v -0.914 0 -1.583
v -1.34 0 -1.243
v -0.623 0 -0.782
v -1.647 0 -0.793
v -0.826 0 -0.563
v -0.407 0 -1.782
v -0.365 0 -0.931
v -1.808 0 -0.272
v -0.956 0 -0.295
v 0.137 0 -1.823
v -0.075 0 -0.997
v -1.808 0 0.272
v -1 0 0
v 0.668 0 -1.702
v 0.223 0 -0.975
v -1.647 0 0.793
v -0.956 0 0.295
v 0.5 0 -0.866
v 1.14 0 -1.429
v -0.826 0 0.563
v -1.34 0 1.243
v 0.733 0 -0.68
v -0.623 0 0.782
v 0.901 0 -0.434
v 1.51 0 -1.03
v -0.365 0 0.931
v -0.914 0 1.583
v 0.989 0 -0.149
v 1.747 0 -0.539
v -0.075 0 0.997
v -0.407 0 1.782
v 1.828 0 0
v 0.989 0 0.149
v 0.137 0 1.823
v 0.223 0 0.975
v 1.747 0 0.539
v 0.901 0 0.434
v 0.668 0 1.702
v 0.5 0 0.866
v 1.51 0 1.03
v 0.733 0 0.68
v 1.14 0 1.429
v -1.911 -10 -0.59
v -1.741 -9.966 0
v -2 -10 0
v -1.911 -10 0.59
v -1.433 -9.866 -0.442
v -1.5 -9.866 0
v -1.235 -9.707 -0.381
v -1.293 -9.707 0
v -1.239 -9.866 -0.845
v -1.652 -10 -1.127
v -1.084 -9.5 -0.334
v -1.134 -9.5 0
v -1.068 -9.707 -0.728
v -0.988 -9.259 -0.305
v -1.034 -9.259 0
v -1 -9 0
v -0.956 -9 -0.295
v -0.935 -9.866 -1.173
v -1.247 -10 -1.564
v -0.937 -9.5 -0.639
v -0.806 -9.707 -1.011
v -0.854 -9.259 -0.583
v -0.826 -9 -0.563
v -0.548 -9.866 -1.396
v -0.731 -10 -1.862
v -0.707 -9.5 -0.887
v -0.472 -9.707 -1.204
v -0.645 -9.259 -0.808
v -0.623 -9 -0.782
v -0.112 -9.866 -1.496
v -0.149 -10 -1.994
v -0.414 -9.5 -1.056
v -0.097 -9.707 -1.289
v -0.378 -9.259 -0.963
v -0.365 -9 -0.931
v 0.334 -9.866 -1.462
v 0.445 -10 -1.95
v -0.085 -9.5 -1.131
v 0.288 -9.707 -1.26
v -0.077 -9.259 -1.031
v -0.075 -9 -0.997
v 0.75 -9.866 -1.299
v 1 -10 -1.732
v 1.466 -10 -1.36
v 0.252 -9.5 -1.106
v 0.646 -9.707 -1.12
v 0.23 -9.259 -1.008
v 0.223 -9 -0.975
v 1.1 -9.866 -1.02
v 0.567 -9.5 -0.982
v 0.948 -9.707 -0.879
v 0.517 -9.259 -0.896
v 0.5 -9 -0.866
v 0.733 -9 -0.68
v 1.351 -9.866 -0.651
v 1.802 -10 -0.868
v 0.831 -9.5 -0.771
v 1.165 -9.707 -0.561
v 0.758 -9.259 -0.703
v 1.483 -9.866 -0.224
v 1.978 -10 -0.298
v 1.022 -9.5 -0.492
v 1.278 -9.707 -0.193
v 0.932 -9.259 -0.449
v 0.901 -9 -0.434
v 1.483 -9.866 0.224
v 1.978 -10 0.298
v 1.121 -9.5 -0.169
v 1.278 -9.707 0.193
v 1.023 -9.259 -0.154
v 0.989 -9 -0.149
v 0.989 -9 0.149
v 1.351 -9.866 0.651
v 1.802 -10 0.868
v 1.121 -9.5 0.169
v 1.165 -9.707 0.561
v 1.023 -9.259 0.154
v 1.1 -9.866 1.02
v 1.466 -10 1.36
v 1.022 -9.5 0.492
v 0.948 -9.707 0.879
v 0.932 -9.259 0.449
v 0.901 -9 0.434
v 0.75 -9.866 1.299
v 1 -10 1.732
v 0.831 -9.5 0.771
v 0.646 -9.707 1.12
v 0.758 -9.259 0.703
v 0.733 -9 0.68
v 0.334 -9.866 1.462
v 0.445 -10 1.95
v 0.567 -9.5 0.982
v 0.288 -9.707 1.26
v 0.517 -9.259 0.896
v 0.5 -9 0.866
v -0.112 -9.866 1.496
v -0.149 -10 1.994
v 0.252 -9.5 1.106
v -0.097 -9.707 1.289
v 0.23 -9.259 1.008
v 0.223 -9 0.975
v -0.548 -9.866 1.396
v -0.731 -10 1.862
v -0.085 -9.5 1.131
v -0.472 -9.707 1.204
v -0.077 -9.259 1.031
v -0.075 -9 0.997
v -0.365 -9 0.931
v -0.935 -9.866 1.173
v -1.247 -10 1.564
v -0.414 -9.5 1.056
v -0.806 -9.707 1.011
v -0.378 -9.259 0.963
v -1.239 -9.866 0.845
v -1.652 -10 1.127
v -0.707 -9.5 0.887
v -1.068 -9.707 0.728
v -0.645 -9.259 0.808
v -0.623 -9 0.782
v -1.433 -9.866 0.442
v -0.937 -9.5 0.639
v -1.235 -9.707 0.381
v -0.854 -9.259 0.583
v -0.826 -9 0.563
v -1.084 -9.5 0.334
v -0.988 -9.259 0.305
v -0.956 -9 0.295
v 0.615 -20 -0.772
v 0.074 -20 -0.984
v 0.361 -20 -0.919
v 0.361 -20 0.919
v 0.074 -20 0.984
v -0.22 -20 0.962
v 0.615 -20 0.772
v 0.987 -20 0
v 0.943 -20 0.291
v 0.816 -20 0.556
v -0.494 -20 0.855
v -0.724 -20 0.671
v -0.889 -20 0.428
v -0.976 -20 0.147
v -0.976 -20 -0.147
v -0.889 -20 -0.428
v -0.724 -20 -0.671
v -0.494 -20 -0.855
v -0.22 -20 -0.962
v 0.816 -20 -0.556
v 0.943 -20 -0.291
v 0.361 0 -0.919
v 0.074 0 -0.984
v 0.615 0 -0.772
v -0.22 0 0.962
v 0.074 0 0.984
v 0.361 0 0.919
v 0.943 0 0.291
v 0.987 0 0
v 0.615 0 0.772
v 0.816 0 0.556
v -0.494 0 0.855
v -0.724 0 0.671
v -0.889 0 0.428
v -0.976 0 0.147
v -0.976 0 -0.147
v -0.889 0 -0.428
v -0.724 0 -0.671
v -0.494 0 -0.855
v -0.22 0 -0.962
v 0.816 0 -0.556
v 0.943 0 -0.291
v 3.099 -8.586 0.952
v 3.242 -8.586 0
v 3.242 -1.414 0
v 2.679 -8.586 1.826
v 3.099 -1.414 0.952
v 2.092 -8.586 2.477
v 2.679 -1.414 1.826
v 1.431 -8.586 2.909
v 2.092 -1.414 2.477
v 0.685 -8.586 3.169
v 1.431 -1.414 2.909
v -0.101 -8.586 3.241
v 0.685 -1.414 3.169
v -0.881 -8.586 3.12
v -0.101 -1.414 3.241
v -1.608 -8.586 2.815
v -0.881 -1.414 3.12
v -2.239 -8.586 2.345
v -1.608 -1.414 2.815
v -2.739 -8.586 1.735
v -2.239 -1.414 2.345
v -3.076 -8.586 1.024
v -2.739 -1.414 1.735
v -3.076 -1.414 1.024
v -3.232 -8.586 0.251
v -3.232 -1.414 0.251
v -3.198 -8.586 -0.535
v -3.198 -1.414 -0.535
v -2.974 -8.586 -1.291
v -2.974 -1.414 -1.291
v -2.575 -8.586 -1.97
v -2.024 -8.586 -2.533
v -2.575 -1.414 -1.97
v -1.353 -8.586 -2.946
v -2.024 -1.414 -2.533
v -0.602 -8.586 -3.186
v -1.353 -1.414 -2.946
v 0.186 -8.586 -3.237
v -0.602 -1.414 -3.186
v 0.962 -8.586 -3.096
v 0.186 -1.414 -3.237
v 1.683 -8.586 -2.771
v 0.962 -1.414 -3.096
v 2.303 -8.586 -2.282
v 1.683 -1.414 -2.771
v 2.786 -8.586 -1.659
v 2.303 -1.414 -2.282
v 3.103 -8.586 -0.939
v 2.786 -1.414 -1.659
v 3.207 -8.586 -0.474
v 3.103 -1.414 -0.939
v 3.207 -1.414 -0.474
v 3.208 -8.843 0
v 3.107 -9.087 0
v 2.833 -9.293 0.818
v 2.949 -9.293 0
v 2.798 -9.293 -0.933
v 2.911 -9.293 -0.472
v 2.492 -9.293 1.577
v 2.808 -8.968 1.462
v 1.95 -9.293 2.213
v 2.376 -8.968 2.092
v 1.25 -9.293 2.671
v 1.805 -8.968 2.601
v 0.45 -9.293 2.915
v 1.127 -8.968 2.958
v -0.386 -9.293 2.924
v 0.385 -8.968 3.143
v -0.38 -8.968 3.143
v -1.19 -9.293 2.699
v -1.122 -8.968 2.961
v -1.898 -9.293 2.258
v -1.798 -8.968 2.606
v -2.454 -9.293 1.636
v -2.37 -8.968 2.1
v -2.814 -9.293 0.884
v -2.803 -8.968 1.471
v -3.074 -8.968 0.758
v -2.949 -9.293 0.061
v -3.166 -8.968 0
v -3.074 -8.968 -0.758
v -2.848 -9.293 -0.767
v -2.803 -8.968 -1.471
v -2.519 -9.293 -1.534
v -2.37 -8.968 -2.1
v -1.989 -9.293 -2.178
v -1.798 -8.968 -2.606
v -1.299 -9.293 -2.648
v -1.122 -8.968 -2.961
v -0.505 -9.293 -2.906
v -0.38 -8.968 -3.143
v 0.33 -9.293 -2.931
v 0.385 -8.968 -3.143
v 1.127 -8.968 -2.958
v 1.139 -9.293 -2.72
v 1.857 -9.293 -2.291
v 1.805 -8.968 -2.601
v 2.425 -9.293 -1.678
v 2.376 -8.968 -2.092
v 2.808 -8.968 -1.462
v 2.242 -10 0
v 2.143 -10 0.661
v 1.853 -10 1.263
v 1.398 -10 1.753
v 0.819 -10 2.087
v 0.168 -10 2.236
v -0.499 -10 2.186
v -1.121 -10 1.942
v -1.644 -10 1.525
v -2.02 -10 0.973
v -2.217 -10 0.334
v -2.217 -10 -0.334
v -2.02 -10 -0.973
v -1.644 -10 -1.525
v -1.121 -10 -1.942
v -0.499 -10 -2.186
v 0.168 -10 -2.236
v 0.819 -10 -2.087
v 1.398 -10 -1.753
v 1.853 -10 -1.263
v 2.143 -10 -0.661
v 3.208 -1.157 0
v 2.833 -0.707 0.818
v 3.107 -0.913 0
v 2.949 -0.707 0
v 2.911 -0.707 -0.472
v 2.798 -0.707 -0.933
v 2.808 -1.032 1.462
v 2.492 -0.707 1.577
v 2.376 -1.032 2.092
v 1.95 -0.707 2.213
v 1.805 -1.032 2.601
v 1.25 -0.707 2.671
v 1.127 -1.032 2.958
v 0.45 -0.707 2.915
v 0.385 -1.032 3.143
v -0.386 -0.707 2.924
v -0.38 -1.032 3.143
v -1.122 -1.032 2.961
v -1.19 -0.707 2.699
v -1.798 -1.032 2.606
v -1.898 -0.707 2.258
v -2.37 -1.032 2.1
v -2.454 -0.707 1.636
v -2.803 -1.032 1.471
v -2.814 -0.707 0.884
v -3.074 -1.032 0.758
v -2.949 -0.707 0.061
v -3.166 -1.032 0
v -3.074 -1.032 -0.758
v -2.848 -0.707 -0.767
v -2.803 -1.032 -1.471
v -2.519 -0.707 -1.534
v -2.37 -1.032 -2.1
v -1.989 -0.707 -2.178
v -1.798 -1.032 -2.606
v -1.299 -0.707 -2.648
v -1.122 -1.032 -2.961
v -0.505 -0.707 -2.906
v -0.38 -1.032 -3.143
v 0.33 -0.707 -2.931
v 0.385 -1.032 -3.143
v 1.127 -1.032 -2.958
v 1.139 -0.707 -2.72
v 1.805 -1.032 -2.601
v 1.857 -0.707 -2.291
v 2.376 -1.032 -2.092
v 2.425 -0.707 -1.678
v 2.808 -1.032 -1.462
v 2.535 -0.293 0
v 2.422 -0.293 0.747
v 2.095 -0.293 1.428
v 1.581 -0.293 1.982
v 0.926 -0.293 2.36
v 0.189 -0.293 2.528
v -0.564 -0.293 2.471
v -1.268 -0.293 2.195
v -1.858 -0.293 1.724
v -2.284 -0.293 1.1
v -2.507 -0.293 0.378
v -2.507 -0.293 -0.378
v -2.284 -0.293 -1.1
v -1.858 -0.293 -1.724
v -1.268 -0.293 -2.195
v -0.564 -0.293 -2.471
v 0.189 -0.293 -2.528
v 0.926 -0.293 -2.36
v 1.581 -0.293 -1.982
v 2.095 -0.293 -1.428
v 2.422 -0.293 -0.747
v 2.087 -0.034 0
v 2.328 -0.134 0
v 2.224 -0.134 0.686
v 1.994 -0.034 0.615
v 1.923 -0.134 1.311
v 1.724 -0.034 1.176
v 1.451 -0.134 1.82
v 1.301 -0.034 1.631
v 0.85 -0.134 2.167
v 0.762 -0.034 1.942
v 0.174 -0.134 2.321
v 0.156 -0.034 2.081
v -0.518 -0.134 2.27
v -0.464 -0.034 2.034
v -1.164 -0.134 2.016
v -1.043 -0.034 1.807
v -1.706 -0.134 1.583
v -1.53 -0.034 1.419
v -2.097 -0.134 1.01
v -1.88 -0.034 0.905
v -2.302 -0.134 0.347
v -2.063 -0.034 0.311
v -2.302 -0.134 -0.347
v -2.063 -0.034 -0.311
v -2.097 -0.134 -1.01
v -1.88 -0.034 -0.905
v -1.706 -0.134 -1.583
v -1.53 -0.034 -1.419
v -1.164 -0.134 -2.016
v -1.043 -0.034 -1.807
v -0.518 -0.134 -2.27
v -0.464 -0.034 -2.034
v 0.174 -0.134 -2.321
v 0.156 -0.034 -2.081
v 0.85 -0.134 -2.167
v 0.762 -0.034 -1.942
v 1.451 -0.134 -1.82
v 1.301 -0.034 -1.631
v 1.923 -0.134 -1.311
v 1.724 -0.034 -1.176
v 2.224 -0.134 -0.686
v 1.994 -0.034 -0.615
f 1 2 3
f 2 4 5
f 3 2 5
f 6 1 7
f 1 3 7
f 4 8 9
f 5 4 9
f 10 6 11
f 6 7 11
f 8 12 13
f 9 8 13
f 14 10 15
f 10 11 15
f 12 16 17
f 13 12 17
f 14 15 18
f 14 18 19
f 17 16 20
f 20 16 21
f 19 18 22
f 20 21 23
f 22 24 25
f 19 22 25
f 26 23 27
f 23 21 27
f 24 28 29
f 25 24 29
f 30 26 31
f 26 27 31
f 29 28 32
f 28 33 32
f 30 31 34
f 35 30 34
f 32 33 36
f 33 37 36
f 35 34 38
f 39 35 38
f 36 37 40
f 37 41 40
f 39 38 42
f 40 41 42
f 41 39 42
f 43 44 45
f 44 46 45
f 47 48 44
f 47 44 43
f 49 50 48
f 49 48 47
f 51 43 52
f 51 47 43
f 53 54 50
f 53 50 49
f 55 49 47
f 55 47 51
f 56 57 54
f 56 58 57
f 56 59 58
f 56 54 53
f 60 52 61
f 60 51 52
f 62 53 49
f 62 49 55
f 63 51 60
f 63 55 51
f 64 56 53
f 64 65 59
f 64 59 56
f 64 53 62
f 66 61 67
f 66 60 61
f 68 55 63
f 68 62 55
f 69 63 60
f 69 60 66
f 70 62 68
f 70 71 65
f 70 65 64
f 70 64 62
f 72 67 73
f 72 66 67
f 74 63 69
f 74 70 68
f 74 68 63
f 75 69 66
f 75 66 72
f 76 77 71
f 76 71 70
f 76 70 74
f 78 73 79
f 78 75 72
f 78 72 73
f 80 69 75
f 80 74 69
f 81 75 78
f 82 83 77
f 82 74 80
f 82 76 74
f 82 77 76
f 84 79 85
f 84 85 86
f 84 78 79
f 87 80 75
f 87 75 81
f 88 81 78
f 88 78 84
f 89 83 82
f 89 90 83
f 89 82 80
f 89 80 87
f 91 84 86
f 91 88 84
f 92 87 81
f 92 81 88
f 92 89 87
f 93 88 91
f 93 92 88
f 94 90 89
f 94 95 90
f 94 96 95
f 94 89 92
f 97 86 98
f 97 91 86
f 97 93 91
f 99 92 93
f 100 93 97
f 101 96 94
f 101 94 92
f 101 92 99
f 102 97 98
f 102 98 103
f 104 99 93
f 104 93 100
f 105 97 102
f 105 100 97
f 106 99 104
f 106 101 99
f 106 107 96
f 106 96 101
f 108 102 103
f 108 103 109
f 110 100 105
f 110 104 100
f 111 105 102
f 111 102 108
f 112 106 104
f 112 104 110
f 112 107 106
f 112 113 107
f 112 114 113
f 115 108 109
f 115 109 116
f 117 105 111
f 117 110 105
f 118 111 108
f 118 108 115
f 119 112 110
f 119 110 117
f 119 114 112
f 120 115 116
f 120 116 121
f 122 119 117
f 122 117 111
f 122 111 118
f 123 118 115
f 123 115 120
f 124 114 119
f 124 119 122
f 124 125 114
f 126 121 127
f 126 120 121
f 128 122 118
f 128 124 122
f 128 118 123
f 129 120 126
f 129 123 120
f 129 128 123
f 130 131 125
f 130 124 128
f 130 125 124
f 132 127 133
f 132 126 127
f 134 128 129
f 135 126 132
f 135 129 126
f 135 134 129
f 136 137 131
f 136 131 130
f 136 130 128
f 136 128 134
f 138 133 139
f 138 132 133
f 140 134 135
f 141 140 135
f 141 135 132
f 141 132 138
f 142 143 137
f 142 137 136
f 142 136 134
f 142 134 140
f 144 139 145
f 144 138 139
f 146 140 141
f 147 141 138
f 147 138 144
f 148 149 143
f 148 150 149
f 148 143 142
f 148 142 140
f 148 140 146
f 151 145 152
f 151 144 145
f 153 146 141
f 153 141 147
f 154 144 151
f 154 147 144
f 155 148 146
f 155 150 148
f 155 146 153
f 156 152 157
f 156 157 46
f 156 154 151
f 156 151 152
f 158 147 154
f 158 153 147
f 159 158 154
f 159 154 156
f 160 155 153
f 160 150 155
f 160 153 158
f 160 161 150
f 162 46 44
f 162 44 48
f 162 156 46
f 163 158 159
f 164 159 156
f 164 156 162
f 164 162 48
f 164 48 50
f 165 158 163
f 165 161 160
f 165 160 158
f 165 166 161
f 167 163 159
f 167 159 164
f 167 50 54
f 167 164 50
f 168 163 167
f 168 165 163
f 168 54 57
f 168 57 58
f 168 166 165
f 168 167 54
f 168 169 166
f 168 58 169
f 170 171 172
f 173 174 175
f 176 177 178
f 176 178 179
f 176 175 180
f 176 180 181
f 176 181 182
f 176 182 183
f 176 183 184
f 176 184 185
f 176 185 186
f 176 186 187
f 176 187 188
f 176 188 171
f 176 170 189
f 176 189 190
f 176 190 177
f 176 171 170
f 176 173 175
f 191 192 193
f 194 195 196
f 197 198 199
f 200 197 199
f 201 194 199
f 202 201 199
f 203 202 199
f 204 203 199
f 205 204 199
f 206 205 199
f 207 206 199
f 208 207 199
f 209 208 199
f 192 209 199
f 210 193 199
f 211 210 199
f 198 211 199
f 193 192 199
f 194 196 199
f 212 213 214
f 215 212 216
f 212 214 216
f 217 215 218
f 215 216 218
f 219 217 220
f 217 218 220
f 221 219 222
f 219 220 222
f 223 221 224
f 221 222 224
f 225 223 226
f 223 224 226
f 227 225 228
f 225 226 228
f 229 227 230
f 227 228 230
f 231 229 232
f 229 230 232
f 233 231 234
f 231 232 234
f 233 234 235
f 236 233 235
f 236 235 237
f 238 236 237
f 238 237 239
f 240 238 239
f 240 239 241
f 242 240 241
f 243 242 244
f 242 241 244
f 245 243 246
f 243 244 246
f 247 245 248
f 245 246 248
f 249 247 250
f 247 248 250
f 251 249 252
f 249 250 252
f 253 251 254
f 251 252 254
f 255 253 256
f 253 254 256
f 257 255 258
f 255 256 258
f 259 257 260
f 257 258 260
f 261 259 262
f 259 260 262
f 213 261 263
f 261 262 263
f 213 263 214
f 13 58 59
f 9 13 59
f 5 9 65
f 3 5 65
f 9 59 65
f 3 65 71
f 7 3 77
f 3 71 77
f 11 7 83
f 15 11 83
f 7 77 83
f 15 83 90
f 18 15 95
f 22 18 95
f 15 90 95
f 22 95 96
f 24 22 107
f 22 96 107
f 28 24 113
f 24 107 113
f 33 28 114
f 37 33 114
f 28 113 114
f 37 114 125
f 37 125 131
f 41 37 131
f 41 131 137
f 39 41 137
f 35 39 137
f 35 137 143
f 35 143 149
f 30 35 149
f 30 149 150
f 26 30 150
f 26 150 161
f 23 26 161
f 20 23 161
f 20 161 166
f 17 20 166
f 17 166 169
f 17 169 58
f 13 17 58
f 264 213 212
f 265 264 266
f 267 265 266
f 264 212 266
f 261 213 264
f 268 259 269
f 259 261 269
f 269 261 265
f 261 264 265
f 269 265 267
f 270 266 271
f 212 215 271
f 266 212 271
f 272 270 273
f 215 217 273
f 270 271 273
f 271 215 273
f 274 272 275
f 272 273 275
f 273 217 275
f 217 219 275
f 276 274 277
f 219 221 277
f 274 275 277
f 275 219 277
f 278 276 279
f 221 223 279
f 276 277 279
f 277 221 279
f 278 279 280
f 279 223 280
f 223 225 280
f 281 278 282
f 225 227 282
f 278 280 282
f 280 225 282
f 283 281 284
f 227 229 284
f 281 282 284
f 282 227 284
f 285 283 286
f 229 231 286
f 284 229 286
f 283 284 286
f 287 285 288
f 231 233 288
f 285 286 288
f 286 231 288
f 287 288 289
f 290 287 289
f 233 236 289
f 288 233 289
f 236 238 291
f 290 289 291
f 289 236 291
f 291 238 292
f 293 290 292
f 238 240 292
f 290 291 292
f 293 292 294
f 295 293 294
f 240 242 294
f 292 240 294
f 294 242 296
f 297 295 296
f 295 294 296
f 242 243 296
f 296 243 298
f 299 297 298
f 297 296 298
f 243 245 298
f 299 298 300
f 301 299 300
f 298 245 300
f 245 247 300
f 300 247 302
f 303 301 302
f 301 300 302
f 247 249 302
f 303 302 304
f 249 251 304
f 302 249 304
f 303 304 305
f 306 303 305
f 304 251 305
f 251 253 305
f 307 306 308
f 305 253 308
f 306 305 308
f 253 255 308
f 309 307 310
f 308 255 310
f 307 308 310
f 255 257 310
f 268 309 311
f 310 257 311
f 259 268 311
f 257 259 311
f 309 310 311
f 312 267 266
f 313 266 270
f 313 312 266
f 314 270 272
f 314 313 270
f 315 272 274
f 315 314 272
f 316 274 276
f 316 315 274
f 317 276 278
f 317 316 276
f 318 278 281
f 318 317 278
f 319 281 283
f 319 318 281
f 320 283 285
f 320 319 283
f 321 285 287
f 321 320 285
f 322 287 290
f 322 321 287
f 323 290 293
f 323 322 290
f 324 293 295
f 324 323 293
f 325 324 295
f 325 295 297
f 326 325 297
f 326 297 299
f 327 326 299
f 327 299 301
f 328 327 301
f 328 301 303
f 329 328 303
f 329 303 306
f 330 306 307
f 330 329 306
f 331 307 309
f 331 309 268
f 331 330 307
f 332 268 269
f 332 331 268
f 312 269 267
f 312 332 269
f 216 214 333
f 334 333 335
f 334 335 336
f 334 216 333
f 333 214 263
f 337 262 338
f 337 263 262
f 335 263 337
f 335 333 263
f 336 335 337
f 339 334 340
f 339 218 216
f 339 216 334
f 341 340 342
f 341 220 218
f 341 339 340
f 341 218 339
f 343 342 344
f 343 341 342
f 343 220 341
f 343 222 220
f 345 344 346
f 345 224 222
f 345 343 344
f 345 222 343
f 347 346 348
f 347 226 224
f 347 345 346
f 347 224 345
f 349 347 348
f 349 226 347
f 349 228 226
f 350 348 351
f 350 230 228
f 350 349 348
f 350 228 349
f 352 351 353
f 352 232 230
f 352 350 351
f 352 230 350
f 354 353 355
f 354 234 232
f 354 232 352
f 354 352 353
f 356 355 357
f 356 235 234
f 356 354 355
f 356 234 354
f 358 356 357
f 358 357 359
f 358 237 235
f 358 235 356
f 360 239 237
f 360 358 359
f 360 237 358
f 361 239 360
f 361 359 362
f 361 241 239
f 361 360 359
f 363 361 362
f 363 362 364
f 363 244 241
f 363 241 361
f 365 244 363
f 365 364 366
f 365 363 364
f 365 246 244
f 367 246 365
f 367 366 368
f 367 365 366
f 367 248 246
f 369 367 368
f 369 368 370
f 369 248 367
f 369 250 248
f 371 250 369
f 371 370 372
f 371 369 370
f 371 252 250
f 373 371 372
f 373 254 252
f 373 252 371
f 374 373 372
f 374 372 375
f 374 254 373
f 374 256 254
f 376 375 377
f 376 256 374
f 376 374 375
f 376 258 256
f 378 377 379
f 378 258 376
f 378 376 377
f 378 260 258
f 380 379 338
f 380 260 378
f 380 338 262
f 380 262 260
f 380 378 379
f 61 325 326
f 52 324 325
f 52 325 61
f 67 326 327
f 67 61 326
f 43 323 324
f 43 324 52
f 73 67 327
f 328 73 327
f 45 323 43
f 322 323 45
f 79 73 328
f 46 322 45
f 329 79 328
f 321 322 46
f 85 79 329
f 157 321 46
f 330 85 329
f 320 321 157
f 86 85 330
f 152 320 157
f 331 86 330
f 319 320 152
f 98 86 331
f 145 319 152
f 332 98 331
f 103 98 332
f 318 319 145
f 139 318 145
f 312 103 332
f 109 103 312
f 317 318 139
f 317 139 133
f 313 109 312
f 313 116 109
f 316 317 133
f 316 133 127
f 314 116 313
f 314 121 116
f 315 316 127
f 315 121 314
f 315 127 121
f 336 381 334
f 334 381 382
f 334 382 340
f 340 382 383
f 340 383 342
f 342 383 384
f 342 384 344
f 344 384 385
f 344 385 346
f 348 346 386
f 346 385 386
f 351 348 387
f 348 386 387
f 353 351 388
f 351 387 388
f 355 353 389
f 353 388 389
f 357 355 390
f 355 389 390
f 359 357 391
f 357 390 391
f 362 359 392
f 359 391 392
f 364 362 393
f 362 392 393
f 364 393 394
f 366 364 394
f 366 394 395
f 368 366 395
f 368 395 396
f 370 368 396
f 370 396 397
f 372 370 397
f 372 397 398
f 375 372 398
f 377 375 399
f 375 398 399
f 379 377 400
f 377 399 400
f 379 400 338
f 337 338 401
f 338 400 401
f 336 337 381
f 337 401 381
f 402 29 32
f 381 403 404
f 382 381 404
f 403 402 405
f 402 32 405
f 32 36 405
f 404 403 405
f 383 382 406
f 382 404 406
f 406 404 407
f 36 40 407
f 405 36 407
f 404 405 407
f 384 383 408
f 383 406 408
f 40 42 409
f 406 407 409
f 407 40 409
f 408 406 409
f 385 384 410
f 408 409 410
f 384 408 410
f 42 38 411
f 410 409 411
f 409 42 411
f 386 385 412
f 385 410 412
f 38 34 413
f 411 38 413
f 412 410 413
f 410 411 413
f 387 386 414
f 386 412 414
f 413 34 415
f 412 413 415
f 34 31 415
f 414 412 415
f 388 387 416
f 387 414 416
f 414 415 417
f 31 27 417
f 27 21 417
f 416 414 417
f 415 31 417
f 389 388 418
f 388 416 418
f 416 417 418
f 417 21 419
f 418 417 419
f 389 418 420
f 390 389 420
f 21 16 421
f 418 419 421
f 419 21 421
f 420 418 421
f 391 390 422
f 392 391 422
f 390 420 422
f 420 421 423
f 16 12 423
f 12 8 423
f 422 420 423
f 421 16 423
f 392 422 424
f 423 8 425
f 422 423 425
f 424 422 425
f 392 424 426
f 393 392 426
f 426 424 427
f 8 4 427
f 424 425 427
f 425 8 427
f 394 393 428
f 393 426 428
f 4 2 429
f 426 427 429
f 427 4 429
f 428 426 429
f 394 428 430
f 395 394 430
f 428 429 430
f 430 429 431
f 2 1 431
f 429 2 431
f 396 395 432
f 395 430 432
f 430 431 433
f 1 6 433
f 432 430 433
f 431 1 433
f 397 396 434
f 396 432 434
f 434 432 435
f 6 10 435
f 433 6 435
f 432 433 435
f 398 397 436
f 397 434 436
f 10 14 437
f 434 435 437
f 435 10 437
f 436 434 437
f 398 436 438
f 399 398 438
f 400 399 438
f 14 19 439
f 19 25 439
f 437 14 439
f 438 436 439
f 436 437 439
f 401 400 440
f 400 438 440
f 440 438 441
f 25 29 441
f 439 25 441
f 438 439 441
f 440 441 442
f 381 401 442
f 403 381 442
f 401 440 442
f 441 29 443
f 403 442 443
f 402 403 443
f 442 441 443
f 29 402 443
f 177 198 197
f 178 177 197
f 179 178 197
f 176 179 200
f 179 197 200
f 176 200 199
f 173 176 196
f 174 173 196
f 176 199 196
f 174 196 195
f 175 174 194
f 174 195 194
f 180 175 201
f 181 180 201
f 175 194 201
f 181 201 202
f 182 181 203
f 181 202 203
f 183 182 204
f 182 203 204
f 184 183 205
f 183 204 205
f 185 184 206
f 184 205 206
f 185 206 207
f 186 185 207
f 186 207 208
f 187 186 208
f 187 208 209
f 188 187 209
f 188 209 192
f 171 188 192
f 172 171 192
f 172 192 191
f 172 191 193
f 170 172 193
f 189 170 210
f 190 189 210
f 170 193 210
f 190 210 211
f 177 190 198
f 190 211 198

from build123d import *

# Parameters (mm, degrees)
F0_R     = 3.2421303212
F1_DEPTH = 10
F2_SIZE  = 1
F4_D     = 2
F5_R     = 1
F6_R     = 0.9870539352
F7_DEPTH = 20


with BuildPart() as f1:
    # F0 (on Front) → F1 (new body)
    with BuildSketch(Plane.XZ):
        Circle(F0_R)
    extrude(amount=F1_DEPTH)

    # F2
    f2_edges = [f1.edges().sort_by_distance(p)[0] for p in [
        (3.24213, -5, 0),
        (-3.24213, 0, 0),
        (-3.24213, -10, 0),
    ]]
    chamfer(f2_edges, length=F2_SIZE)

    # F4 (through all)
    with Locations(Plane(origin=(0, 0, 0), x_dir=(1, 0, 0), z_dir=(0, 1, 0))):
        with Locations((0, 0)):
            Hole(F4_D / 2)

    # F5
    f5_edges = [f1.edges().sort_by_distance(p)[0] for p in [
        (-3.24213, -9, 0),
        (-3.24213, -1, 0),
        (2.74213, -0.5, 0),
        (-2.24213, 0, 0),
        (-1, -10, 0),
    ]]
    fillet(f5_edges, radius=F5_R)


with BuildPart() as f7:
    # F6 (on Front) → F7 (new body)
    with BuildSketch(Plane.XZ):
        Circle(F6_R)
    extrude(amount=F7_DEPTH)


solid = Compound([f1.part, f7.part])
